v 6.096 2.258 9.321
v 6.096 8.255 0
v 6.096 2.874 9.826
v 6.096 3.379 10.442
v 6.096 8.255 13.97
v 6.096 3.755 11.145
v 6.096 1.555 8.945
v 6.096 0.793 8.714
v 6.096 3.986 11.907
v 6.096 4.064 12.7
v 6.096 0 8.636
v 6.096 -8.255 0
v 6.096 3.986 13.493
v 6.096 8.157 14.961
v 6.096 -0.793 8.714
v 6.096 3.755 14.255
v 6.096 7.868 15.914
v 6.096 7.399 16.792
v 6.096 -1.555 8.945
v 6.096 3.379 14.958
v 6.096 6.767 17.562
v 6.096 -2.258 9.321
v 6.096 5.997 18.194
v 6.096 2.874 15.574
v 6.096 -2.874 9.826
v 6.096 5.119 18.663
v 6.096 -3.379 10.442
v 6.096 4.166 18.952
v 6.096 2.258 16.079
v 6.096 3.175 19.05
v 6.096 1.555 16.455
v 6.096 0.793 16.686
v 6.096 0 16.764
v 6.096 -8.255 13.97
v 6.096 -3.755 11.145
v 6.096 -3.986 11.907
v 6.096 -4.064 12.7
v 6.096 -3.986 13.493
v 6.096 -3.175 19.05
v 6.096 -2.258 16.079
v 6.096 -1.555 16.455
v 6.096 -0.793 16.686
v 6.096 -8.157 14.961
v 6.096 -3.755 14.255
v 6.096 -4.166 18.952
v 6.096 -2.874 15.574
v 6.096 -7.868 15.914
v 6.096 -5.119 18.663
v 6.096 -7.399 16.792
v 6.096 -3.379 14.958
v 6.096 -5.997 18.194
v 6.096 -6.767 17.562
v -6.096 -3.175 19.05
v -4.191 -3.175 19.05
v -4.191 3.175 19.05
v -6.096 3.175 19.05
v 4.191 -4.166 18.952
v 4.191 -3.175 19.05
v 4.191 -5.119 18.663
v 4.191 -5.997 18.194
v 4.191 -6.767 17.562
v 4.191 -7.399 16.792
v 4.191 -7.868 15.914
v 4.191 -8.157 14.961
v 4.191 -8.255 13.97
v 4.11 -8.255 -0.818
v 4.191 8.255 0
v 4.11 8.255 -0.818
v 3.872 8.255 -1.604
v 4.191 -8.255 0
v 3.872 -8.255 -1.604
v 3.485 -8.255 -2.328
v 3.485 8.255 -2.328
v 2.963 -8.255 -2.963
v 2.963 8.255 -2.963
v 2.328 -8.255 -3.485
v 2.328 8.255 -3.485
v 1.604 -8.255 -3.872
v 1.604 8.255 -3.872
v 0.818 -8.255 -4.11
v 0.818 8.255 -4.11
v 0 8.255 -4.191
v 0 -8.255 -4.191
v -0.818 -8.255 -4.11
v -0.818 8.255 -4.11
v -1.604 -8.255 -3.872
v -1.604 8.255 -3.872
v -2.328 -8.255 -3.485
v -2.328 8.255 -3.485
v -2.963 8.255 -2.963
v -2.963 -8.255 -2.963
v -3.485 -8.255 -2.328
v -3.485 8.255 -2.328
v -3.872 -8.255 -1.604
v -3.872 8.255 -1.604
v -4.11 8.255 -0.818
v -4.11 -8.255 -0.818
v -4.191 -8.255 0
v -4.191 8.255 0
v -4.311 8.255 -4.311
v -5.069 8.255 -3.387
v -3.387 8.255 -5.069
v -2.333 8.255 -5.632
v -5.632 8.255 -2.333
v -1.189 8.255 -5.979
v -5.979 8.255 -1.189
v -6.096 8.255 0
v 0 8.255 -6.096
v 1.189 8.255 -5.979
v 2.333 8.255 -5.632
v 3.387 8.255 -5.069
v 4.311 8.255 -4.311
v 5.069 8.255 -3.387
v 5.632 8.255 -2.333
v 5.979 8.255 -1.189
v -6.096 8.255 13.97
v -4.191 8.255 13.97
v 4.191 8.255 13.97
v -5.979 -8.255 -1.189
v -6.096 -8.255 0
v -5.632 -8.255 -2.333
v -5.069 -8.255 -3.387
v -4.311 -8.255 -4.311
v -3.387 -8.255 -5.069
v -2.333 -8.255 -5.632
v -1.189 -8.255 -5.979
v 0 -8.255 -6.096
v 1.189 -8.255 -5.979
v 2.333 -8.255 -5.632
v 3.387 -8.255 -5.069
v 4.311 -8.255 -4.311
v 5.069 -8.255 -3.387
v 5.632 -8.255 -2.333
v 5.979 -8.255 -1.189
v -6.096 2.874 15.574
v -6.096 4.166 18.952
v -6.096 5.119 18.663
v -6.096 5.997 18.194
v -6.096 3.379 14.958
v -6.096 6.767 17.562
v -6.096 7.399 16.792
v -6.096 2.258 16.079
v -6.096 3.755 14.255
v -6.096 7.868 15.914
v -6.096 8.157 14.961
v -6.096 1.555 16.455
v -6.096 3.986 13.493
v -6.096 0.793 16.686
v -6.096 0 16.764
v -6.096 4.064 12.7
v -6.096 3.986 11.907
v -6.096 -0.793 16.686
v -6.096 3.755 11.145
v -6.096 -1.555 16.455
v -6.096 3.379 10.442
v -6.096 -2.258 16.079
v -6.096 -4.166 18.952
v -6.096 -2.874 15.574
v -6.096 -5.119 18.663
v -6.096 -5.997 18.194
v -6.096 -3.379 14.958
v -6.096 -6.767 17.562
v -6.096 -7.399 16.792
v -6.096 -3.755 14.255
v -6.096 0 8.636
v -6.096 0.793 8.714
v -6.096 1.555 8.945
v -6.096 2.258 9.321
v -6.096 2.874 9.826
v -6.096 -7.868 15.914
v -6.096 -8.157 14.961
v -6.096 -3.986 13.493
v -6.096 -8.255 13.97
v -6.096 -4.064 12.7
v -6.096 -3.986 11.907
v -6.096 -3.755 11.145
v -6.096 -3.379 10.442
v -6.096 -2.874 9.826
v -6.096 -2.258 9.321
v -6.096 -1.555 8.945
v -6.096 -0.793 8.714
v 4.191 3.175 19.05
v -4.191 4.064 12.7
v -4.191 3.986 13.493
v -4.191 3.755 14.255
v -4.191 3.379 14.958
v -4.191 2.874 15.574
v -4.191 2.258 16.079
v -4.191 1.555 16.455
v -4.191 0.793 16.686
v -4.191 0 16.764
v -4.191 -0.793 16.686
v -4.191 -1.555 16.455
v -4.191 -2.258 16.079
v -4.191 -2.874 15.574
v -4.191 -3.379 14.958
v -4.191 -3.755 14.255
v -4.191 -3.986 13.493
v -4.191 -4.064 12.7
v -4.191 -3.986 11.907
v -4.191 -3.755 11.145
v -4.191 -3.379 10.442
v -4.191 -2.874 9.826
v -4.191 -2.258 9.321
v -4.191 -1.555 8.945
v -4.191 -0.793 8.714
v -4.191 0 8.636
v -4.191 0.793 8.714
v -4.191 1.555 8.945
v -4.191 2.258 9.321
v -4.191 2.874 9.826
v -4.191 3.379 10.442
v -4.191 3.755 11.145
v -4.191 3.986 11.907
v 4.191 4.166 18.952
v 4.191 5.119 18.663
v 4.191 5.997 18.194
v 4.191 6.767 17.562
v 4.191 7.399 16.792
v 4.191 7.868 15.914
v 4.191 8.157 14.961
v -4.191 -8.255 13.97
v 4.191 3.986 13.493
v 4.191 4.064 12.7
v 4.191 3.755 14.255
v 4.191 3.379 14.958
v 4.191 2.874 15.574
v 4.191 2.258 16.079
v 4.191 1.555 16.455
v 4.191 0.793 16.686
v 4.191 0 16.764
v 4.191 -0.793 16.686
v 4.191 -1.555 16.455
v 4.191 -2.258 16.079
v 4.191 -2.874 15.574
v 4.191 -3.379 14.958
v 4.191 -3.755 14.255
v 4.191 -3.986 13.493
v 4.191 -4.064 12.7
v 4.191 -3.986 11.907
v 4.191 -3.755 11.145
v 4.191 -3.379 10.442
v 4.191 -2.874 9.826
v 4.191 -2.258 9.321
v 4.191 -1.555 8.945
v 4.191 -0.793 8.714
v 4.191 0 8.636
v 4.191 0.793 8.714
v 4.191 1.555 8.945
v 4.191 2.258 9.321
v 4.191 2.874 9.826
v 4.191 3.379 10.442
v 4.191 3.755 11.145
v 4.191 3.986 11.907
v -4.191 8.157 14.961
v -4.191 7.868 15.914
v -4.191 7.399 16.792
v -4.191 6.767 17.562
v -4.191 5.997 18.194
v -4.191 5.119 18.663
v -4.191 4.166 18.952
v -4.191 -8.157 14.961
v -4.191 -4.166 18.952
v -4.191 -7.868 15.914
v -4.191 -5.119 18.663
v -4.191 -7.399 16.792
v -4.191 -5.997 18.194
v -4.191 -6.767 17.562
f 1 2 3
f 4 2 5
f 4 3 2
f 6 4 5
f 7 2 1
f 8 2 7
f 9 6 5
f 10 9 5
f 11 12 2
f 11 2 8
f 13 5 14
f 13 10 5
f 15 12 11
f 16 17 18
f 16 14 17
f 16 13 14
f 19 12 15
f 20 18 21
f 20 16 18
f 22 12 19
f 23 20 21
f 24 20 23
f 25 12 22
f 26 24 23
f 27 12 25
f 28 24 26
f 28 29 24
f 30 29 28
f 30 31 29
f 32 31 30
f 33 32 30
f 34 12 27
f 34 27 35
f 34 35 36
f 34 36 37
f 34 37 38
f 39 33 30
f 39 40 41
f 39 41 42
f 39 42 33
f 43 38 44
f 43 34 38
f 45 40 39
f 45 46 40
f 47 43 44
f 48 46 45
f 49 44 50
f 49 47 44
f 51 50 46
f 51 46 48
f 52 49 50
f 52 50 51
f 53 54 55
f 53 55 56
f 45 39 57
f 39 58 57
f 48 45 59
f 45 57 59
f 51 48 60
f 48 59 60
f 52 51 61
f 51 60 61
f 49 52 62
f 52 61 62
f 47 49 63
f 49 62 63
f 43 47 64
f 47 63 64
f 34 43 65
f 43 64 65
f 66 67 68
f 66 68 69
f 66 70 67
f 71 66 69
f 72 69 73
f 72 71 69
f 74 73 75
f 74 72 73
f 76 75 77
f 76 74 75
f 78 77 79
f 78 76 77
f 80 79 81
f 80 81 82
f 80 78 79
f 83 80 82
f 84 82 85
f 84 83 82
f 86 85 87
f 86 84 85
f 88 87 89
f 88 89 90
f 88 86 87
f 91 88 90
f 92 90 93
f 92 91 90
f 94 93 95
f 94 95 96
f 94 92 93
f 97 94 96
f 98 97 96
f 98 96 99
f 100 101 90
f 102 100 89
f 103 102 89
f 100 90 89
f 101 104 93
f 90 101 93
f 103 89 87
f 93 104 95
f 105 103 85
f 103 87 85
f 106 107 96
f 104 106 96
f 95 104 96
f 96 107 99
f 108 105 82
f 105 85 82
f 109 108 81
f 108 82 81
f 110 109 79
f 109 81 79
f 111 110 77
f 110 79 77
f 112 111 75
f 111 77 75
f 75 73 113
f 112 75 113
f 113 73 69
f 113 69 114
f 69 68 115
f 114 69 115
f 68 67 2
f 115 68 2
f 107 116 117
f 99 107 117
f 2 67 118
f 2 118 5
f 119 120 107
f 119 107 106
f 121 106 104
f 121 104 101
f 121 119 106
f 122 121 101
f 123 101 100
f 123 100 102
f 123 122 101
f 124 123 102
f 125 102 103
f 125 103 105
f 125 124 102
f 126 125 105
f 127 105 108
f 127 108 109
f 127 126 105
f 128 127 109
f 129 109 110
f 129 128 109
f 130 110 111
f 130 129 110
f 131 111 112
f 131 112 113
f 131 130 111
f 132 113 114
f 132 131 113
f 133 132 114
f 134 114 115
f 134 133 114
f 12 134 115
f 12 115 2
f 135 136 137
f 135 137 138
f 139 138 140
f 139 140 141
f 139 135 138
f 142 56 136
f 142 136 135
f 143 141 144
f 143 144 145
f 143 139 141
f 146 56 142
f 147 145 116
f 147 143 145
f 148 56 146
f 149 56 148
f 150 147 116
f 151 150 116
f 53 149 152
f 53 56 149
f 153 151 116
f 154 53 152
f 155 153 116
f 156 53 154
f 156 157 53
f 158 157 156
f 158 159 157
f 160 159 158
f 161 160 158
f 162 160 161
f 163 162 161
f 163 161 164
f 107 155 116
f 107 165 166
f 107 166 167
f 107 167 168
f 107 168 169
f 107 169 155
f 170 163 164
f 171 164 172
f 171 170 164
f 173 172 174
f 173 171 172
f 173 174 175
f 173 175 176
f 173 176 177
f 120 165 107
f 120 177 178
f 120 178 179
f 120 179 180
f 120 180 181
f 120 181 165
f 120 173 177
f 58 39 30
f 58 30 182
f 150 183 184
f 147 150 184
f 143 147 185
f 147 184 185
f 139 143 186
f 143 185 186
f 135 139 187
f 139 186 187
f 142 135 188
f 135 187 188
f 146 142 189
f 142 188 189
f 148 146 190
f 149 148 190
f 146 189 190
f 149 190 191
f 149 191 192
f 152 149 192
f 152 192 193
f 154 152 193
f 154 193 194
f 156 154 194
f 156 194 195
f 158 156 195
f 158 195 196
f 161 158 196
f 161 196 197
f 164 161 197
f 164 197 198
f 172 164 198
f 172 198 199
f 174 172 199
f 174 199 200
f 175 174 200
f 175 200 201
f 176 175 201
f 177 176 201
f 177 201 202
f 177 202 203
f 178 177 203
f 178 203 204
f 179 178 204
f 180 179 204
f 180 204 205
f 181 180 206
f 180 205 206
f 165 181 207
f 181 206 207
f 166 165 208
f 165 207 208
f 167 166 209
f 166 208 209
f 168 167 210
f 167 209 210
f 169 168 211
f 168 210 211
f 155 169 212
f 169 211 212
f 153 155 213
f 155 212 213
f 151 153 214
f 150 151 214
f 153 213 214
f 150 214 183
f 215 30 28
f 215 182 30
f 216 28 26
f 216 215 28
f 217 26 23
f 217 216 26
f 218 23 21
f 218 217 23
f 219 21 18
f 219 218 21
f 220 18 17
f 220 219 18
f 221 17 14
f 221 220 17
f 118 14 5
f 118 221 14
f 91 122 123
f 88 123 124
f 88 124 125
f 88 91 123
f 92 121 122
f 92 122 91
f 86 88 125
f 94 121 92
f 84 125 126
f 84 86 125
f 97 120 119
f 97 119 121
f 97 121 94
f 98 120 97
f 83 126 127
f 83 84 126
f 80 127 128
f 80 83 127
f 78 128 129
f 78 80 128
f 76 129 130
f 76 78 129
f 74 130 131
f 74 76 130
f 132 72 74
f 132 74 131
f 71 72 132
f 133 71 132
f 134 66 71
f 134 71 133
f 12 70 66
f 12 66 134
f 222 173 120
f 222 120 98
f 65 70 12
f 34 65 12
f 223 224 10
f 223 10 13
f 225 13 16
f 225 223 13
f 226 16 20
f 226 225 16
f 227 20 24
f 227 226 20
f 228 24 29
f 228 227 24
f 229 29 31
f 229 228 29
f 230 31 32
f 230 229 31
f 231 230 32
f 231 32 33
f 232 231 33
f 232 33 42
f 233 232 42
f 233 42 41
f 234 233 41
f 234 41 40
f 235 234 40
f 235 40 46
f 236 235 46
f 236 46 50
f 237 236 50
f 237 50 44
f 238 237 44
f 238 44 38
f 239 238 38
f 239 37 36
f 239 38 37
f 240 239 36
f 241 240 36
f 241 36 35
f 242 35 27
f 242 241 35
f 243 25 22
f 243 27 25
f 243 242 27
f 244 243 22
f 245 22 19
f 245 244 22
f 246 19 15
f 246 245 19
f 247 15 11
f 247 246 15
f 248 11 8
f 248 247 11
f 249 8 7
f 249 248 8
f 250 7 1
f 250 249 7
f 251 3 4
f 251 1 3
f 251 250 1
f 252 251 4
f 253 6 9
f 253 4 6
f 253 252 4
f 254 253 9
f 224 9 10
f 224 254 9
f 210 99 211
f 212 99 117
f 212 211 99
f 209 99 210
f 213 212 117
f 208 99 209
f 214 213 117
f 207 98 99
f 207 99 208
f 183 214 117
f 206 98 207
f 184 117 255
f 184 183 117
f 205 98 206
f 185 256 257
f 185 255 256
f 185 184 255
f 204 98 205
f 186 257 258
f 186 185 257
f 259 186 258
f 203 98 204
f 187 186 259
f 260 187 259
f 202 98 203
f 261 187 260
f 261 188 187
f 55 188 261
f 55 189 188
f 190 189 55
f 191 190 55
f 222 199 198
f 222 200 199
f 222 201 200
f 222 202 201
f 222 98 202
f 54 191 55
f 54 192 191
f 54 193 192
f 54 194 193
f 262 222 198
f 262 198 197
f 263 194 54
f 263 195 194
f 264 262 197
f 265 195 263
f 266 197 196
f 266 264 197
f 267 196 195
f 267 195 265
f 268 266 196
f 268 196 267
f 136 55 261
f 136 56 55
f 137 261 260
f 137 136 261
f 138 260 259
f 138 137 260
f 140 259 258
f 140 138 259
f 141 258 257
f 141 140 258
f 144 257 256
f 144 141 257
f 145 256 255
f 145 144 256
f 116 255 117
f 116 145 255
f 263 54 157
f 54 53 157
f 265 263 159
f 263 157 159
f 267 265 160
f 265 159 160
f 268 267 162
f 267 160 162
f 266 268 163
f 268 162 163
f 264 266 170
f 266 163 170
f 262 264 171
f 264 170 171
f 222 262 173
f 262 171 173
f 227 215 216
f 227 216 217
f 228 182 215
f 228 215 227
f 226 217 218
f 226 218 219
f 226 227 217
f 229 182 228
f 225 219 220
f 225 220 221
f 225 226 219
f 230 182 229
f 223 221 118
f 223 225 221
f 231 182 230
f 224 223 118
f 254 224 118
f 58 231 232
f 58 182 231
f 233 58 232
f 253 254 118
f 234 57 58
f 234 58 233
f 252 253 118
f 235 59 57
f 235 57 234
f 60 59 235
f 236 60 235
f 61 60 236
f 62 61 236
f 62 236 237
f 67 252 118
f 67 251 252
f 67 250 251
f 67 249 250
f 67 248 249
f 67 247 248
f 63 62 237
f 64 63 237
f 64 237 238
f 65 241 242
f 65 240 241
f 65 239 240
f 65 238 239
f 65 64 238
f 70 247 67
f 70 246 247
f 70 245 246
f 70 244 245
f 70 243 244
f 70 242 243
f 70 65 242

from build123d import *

# Parameters (mm, degrees)
F1_DEPTH      = 8.255
F2_R          = 5.08
F3_R          = 4.064
F4_DEPTH      = 6.097
F4_DEPTH_BACK = 6.097


with BuildPart() as f1:
    # F0 (on Front) → F1 (new body, symmetric)
    with BuildSketch(Plane.XZ):
        with BuildLine():
            ThreePointArc((4.191, 0), (0, -4.191), (-4.191, 0))
            Line((-4.191, 0), (-4.191, 19.05))
            Line((-4.191, 19.05), (-6.096, 19.05))
            Line((-6.096, 19.05), (-6.096, 0))
            ThreePointArc((-6.096, 0), (0, -6.096), (6.096, 0))
            Line((6.096, 0), (6.096, 19.05))
            Line((6.096, 19.05), (4.191, 19.05))
            Line((4.191, 19.05), (4.191, 0))
        make_face()
    extrude(amount=F1_DEPTH, both=True)

    # F2
    f2_edges = [f1.edges().sort_by_distance(p)[0] for p in [
        (5.1435, -8.255, 19.05),
        (5.1435, 8.255, 19.05),
        (-5.1435, 8.255, 19.05),
        (-5.1435, -8.255, 19.05),
    ]]
    fillet(f2_edges, radius=F2_R)

    # F3 (on Right) → F4 (cut, two sides)
    with BuildSketch(Plane.YZ) as f4_sk:
        with Locations((0, 12.7)):
            Circle(F3_R)
    extrude(amount=F4_DEPTH, mode=Mode.SUBTRACT)
    extrude(f4_sk.sketch, amount=-F4_DEPTH_BACK, mode=Mode.SUBTRACT)


solid = f1.part
